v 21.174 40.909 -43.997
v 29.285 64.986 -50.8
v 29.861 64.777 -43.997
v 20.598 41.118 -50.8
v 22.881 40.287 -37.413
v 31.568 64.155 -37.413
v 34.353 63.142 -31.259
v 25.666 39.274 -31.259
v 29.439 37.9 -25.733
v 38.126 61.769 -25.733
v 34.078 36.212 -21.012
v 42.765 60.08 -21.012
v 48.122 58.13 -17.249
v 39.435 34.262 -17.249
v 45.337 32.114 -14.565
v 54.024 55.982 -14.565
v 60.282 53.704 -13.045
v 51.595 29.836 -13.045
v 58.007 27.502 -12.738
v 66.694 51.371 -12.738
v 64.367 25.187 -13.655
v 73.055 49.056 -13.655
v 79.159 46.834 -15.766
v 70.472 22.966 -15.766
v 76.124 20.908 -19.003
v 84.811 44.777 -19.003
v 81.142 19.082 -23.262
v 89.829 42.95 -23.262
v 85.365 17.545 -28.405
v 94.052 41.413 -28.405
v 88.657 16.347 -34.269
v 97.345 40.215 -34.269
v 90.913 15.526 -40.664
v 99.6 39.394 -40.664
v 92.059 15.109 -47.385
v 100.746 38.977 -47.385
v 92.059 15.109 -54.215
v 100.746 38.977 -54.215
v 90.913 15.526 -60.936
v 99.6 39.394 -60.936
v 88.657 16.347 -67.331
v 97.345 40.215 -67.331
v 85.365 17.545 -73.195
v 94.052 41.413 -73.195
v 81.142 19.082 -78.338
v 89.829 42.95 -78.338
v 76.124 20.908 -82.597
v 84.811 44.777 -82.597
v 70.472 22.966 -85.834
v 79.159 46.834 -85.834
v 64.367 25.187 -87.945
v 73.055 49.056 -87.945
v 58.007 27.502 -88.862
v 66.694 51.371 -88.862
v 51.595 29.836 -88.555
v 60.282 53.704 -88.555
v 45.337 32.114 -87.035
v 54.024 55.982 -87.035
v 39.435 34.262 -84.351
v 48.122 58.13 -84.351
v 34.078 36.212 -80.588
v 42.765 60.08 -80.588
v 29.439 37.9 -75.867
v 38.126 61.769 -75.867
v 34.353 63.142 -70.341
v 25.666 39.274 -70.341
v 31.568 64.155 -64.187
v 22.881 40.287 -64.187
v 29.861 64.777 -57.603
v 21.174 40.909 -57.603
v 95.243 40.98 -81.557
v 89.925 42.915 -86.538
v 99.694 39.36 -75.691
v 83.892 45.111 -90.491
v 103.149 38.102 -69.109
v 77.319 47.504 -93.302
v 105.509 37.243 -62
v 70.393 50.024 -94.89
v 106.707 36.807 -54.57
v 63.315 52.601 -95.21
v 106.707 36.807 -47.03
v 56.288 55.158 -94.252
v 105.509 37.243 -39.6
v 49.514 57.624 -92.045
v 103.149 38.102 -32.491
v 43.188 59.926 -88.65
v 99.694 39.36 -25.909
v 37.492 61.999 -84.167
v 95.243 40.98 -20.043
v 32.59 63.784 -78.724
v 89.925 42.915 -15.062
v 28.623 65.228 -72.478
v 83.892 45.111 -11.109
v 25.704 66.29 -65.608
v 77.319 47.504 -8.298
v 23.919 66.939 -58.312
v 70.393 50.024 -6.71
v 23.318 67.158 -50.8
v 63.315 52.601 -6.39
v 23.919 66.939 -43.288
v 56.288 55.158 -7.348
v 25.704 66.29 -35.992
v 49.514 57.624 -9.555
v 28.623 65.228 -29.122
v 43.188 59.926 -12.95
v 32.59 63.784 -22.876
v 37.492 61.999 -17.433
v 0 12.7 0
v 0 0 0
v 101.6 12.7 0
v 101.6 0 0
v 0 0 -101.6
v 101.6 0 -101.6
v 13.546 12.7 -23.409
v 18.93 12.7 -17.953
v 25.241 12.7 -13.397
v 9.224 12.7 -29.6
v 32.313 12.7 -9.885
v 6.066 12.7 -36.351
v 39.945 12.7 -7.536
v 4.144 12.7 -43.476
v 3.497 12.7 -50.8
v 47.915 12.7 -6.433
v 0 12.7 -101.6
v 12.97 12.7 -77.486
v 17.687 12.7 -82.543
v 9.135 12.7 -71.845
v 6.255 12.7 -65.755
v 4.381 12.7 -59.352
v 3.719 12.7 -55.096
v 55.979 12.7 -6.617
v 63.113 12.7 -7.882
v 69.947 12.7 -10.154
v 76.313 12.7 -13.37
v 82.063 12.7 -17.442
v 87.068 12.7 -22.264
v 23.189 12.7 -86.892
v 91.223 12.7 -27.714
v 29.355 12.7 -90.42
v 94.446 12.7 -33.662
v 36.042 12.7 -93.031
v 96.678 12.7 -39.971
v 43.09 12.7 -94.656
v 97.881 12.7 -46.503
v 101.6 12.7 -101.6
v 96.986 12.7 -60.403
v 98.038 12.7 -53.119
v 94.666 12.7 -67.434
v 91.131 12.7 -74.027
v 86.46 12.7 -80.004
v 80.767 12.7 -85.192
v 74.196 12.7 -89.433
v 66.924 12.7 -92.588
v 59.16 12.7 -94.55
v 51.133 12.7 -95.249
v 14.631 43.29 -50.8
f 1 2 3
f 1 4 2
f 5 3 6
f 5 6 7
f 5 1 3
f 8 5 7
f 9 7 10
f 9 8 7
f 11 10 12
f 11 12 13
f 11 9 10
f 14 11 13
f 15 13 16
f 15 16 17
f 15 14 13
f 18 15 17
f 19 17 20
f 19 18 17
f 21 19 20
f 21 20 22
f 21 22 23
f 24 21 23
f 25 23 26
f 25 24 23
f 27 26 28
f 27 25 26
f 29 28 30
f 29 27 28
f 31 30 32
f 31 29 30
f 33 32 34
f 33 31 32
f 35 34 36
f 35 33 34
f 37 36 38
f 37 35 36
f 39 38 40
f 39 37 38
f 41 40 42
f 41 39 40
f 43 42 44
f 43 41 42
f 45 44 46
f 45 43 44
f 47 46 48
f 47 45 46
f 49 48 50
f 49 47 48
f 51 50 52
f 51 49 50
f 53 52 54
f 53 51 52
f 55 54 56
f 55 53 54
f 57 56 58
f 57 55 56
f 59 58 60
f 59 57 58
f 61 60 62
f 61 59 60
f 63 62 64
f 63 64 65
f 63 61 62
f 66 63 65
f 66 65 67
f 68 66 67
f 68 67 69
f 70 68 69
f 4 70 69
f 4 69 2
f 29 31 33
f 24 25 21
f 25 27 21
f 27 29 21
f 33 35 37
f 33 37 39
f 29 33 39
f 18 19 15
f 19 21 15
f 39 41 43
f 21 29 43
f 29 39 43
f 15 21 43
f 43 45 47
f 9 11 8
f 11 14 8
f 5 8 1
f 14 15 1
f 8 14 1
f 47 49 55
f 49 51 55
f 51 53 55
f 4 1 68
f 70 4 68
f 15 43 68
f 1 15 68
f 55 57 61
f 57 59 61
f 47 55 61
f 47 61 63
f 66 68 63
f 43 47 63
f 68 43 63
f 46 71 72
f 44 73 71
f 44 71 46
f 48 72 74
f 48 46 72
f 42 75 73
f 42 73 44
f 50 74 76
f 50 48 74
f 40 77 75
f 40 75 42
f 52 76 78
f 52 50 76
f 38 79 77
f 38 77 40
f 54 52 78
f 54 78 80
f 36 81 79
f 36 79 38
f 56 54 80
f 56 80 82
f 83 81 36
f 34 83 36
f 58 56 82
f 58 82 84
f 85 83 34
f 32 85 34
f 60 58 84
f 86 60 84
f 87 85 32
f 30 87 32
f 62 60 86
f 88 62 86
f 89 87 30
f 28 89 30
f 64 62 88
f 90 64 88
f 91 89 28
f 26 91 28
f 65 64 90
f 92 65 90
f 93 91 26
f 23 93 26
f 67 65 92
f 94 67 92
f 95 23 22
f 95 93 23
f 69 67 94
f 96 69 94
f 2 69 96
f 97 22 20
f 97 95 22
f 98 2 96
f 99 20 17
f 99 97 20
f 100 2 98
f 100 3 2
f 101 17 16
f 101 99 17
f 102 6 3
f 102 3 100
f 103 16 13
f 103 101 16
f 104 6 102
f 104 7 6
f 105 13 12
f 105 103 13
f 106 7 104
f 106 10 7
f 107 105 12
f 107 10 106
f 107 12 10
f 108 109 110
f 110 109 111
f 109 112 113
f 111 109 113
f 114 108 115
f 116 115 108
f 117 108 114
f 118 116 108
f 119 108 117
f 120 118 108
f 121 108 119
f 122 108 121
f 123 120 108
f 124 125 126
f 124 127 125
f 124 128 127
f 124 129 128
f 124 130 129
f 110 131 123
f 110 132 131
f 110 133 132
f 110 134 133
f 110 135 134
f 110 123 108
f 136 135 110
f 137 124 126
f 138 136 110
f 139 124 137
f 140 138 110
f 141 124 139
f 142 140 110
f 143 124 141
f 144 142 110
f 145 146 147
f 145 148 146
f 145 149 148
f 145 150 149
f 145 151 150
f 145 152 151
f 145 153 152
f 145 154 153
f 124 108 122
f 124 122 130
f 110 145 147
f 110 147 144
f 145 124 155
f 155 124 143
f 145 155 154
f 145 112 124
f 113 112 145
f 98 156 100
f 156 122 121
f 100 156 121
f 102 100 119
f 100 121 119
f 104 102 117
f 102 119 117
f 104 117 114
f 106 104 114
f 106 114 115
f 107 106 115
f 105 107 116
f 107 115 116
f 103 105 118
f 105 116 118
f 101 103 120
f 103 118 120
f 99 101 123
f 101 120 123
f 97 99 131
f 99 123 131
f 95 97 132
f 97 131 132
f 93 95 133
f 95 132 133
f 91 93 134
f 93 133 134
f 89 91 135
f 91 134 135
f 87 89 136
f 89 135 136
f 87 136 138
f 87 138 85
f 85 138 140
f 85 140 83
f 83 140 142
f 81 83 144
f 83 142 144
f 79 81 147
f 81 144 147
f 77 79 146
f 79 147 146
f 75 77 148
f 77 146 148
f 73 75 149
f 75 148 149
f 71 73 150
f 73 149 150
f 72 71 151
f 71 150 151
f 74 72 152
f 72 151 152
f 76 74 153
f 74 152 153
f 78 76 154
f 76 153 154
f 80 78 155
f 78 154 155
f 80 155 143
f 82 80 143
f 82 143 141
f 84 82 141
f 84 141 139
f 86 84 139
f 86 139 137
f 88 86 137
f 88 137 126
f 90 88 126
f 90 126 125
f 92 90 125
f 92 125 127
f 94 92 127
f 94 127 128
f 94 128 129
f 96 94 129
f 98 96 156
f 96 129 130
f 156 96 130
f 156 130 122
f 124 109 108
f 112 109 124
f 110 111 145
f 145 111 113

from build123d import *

# Parameters (mm, degrees)
SKETCH1_W           = 101.6
SKETCH1_H           = 101.6
BOSS_EXTRUDE1_DEPTH = 12.7
SKETCH4_R           = 44.45
SKETCH4_R_2         = 38.1
BOSS_EXTRUDE5_DEPTH = 1
BOSS_EXTRUDE6_REACH = 141.847
SKETCH7_R           = 44.45
SKETCH8_R           = 44.45
SKETCH8_R_2         = 38.1
BOSS_EXTRUDE7_DEPTH = 24.4


with BuildPart() as part:
    # Sketch1 → Boss-Extrude1 (new body)
    with BuildSketch(Plane(origin=(0, 0, 0), x_dir=(1, 0, 0), z_dir=(0, 1, 0))):
        with Locations((50.8, 50.8)):
            Rectangle(SKETCH1_W, SKETCH1_H)
    extrude(amount=BOSS_EXTRUDE1_DEPTH)

    # Boss-Extrude6: up to this face of the body (flat: up to its plane)
    boss_extrude6_end = Plane(part.part.faces().sort_by_distance((50.8, 12.7, -50.8))[0])
    # Sketch7 → Boss-Extrude6 (add, up to the picked face)
    with BuildSketch(Plane(origin=(15.624623468, 42.928300165, 0), x_dir=(0.9396926207859082, -0.34202014332566943, 0), z_dir=(-0.34202014332566943, -0.9396926207859082, 0)), mode=Mode.PRIVATE) as boss_extrude6_sk1:
        with Locations(Location((43.392729316, -50.8, 0), (0, 0, 180))):
            Circle(SKETCH7_R)
    boss_extrude6_tool1 = split(extrude(boss_extrude6_sk1.sketch, amount=BOSS_EXTRUDE6_REACH, mode=Mode.PRIVATE), bisect_by=boss_extrude6_end, keep=Keep.BOTH, mode=Mode.PRIVATE)


with BuildPart() as body_2:
    # Sketch4 → Boss-Extrude5 (new body)
    with BuildSketch(Plane(origin=(15.966643611, 43.867992786, 0), x_dir=(0, 0, -1), z_dir=(0.34202014332566943, 0.9396926207859081, 0))):
        with Locations(Location((50.8, -43.392729316, 0), (0, 0, 90))):
            Circle(SKETCH4_R)
        with Locations(Location((50.8, -43.392729316, 0), (0, 0, 90))):
            Circle(SKETCH4_R_2, mode=Mode.SUBTRACT)
    extrude(amount=-BOSS_EXTRUDE5_DEPTH)


with BuildPart() as part_1:
    add(part.part)

    add(body_2.part)  # Boss-Extrude6 merges body 2
    add(boss_extrude6_tool1.solids().sort_by(Axis((56.400451, 28.087113, -50.8), (-0.34202014332566943, -0.9396926207859082, 0)))[0])

    # Sketch8 → Boss-Extrude7 (add)
    with BuildSketch(Plane(origin=(15.966643611, 43.867992786, 0), x_dir=(0.9396926207859082, -0.34202014332566943, 0), z_dir=(0.34202014332566943, 0.9396926207859082, 0))):
        with Locations(Location((43.392729316, 50.8, 0), (0, 0, 180))):
            Circle(SKETCH8_R)
        with Locations(Location((43.392729316, 50.8, 0), (0, 0, 180))):
            Circle(SKETCH8_R_2, mode=Mode.SUBTRACT)
    extrude(amount=BOSS_EXTRUDE7_DEPTH)


solid = part_1.part
